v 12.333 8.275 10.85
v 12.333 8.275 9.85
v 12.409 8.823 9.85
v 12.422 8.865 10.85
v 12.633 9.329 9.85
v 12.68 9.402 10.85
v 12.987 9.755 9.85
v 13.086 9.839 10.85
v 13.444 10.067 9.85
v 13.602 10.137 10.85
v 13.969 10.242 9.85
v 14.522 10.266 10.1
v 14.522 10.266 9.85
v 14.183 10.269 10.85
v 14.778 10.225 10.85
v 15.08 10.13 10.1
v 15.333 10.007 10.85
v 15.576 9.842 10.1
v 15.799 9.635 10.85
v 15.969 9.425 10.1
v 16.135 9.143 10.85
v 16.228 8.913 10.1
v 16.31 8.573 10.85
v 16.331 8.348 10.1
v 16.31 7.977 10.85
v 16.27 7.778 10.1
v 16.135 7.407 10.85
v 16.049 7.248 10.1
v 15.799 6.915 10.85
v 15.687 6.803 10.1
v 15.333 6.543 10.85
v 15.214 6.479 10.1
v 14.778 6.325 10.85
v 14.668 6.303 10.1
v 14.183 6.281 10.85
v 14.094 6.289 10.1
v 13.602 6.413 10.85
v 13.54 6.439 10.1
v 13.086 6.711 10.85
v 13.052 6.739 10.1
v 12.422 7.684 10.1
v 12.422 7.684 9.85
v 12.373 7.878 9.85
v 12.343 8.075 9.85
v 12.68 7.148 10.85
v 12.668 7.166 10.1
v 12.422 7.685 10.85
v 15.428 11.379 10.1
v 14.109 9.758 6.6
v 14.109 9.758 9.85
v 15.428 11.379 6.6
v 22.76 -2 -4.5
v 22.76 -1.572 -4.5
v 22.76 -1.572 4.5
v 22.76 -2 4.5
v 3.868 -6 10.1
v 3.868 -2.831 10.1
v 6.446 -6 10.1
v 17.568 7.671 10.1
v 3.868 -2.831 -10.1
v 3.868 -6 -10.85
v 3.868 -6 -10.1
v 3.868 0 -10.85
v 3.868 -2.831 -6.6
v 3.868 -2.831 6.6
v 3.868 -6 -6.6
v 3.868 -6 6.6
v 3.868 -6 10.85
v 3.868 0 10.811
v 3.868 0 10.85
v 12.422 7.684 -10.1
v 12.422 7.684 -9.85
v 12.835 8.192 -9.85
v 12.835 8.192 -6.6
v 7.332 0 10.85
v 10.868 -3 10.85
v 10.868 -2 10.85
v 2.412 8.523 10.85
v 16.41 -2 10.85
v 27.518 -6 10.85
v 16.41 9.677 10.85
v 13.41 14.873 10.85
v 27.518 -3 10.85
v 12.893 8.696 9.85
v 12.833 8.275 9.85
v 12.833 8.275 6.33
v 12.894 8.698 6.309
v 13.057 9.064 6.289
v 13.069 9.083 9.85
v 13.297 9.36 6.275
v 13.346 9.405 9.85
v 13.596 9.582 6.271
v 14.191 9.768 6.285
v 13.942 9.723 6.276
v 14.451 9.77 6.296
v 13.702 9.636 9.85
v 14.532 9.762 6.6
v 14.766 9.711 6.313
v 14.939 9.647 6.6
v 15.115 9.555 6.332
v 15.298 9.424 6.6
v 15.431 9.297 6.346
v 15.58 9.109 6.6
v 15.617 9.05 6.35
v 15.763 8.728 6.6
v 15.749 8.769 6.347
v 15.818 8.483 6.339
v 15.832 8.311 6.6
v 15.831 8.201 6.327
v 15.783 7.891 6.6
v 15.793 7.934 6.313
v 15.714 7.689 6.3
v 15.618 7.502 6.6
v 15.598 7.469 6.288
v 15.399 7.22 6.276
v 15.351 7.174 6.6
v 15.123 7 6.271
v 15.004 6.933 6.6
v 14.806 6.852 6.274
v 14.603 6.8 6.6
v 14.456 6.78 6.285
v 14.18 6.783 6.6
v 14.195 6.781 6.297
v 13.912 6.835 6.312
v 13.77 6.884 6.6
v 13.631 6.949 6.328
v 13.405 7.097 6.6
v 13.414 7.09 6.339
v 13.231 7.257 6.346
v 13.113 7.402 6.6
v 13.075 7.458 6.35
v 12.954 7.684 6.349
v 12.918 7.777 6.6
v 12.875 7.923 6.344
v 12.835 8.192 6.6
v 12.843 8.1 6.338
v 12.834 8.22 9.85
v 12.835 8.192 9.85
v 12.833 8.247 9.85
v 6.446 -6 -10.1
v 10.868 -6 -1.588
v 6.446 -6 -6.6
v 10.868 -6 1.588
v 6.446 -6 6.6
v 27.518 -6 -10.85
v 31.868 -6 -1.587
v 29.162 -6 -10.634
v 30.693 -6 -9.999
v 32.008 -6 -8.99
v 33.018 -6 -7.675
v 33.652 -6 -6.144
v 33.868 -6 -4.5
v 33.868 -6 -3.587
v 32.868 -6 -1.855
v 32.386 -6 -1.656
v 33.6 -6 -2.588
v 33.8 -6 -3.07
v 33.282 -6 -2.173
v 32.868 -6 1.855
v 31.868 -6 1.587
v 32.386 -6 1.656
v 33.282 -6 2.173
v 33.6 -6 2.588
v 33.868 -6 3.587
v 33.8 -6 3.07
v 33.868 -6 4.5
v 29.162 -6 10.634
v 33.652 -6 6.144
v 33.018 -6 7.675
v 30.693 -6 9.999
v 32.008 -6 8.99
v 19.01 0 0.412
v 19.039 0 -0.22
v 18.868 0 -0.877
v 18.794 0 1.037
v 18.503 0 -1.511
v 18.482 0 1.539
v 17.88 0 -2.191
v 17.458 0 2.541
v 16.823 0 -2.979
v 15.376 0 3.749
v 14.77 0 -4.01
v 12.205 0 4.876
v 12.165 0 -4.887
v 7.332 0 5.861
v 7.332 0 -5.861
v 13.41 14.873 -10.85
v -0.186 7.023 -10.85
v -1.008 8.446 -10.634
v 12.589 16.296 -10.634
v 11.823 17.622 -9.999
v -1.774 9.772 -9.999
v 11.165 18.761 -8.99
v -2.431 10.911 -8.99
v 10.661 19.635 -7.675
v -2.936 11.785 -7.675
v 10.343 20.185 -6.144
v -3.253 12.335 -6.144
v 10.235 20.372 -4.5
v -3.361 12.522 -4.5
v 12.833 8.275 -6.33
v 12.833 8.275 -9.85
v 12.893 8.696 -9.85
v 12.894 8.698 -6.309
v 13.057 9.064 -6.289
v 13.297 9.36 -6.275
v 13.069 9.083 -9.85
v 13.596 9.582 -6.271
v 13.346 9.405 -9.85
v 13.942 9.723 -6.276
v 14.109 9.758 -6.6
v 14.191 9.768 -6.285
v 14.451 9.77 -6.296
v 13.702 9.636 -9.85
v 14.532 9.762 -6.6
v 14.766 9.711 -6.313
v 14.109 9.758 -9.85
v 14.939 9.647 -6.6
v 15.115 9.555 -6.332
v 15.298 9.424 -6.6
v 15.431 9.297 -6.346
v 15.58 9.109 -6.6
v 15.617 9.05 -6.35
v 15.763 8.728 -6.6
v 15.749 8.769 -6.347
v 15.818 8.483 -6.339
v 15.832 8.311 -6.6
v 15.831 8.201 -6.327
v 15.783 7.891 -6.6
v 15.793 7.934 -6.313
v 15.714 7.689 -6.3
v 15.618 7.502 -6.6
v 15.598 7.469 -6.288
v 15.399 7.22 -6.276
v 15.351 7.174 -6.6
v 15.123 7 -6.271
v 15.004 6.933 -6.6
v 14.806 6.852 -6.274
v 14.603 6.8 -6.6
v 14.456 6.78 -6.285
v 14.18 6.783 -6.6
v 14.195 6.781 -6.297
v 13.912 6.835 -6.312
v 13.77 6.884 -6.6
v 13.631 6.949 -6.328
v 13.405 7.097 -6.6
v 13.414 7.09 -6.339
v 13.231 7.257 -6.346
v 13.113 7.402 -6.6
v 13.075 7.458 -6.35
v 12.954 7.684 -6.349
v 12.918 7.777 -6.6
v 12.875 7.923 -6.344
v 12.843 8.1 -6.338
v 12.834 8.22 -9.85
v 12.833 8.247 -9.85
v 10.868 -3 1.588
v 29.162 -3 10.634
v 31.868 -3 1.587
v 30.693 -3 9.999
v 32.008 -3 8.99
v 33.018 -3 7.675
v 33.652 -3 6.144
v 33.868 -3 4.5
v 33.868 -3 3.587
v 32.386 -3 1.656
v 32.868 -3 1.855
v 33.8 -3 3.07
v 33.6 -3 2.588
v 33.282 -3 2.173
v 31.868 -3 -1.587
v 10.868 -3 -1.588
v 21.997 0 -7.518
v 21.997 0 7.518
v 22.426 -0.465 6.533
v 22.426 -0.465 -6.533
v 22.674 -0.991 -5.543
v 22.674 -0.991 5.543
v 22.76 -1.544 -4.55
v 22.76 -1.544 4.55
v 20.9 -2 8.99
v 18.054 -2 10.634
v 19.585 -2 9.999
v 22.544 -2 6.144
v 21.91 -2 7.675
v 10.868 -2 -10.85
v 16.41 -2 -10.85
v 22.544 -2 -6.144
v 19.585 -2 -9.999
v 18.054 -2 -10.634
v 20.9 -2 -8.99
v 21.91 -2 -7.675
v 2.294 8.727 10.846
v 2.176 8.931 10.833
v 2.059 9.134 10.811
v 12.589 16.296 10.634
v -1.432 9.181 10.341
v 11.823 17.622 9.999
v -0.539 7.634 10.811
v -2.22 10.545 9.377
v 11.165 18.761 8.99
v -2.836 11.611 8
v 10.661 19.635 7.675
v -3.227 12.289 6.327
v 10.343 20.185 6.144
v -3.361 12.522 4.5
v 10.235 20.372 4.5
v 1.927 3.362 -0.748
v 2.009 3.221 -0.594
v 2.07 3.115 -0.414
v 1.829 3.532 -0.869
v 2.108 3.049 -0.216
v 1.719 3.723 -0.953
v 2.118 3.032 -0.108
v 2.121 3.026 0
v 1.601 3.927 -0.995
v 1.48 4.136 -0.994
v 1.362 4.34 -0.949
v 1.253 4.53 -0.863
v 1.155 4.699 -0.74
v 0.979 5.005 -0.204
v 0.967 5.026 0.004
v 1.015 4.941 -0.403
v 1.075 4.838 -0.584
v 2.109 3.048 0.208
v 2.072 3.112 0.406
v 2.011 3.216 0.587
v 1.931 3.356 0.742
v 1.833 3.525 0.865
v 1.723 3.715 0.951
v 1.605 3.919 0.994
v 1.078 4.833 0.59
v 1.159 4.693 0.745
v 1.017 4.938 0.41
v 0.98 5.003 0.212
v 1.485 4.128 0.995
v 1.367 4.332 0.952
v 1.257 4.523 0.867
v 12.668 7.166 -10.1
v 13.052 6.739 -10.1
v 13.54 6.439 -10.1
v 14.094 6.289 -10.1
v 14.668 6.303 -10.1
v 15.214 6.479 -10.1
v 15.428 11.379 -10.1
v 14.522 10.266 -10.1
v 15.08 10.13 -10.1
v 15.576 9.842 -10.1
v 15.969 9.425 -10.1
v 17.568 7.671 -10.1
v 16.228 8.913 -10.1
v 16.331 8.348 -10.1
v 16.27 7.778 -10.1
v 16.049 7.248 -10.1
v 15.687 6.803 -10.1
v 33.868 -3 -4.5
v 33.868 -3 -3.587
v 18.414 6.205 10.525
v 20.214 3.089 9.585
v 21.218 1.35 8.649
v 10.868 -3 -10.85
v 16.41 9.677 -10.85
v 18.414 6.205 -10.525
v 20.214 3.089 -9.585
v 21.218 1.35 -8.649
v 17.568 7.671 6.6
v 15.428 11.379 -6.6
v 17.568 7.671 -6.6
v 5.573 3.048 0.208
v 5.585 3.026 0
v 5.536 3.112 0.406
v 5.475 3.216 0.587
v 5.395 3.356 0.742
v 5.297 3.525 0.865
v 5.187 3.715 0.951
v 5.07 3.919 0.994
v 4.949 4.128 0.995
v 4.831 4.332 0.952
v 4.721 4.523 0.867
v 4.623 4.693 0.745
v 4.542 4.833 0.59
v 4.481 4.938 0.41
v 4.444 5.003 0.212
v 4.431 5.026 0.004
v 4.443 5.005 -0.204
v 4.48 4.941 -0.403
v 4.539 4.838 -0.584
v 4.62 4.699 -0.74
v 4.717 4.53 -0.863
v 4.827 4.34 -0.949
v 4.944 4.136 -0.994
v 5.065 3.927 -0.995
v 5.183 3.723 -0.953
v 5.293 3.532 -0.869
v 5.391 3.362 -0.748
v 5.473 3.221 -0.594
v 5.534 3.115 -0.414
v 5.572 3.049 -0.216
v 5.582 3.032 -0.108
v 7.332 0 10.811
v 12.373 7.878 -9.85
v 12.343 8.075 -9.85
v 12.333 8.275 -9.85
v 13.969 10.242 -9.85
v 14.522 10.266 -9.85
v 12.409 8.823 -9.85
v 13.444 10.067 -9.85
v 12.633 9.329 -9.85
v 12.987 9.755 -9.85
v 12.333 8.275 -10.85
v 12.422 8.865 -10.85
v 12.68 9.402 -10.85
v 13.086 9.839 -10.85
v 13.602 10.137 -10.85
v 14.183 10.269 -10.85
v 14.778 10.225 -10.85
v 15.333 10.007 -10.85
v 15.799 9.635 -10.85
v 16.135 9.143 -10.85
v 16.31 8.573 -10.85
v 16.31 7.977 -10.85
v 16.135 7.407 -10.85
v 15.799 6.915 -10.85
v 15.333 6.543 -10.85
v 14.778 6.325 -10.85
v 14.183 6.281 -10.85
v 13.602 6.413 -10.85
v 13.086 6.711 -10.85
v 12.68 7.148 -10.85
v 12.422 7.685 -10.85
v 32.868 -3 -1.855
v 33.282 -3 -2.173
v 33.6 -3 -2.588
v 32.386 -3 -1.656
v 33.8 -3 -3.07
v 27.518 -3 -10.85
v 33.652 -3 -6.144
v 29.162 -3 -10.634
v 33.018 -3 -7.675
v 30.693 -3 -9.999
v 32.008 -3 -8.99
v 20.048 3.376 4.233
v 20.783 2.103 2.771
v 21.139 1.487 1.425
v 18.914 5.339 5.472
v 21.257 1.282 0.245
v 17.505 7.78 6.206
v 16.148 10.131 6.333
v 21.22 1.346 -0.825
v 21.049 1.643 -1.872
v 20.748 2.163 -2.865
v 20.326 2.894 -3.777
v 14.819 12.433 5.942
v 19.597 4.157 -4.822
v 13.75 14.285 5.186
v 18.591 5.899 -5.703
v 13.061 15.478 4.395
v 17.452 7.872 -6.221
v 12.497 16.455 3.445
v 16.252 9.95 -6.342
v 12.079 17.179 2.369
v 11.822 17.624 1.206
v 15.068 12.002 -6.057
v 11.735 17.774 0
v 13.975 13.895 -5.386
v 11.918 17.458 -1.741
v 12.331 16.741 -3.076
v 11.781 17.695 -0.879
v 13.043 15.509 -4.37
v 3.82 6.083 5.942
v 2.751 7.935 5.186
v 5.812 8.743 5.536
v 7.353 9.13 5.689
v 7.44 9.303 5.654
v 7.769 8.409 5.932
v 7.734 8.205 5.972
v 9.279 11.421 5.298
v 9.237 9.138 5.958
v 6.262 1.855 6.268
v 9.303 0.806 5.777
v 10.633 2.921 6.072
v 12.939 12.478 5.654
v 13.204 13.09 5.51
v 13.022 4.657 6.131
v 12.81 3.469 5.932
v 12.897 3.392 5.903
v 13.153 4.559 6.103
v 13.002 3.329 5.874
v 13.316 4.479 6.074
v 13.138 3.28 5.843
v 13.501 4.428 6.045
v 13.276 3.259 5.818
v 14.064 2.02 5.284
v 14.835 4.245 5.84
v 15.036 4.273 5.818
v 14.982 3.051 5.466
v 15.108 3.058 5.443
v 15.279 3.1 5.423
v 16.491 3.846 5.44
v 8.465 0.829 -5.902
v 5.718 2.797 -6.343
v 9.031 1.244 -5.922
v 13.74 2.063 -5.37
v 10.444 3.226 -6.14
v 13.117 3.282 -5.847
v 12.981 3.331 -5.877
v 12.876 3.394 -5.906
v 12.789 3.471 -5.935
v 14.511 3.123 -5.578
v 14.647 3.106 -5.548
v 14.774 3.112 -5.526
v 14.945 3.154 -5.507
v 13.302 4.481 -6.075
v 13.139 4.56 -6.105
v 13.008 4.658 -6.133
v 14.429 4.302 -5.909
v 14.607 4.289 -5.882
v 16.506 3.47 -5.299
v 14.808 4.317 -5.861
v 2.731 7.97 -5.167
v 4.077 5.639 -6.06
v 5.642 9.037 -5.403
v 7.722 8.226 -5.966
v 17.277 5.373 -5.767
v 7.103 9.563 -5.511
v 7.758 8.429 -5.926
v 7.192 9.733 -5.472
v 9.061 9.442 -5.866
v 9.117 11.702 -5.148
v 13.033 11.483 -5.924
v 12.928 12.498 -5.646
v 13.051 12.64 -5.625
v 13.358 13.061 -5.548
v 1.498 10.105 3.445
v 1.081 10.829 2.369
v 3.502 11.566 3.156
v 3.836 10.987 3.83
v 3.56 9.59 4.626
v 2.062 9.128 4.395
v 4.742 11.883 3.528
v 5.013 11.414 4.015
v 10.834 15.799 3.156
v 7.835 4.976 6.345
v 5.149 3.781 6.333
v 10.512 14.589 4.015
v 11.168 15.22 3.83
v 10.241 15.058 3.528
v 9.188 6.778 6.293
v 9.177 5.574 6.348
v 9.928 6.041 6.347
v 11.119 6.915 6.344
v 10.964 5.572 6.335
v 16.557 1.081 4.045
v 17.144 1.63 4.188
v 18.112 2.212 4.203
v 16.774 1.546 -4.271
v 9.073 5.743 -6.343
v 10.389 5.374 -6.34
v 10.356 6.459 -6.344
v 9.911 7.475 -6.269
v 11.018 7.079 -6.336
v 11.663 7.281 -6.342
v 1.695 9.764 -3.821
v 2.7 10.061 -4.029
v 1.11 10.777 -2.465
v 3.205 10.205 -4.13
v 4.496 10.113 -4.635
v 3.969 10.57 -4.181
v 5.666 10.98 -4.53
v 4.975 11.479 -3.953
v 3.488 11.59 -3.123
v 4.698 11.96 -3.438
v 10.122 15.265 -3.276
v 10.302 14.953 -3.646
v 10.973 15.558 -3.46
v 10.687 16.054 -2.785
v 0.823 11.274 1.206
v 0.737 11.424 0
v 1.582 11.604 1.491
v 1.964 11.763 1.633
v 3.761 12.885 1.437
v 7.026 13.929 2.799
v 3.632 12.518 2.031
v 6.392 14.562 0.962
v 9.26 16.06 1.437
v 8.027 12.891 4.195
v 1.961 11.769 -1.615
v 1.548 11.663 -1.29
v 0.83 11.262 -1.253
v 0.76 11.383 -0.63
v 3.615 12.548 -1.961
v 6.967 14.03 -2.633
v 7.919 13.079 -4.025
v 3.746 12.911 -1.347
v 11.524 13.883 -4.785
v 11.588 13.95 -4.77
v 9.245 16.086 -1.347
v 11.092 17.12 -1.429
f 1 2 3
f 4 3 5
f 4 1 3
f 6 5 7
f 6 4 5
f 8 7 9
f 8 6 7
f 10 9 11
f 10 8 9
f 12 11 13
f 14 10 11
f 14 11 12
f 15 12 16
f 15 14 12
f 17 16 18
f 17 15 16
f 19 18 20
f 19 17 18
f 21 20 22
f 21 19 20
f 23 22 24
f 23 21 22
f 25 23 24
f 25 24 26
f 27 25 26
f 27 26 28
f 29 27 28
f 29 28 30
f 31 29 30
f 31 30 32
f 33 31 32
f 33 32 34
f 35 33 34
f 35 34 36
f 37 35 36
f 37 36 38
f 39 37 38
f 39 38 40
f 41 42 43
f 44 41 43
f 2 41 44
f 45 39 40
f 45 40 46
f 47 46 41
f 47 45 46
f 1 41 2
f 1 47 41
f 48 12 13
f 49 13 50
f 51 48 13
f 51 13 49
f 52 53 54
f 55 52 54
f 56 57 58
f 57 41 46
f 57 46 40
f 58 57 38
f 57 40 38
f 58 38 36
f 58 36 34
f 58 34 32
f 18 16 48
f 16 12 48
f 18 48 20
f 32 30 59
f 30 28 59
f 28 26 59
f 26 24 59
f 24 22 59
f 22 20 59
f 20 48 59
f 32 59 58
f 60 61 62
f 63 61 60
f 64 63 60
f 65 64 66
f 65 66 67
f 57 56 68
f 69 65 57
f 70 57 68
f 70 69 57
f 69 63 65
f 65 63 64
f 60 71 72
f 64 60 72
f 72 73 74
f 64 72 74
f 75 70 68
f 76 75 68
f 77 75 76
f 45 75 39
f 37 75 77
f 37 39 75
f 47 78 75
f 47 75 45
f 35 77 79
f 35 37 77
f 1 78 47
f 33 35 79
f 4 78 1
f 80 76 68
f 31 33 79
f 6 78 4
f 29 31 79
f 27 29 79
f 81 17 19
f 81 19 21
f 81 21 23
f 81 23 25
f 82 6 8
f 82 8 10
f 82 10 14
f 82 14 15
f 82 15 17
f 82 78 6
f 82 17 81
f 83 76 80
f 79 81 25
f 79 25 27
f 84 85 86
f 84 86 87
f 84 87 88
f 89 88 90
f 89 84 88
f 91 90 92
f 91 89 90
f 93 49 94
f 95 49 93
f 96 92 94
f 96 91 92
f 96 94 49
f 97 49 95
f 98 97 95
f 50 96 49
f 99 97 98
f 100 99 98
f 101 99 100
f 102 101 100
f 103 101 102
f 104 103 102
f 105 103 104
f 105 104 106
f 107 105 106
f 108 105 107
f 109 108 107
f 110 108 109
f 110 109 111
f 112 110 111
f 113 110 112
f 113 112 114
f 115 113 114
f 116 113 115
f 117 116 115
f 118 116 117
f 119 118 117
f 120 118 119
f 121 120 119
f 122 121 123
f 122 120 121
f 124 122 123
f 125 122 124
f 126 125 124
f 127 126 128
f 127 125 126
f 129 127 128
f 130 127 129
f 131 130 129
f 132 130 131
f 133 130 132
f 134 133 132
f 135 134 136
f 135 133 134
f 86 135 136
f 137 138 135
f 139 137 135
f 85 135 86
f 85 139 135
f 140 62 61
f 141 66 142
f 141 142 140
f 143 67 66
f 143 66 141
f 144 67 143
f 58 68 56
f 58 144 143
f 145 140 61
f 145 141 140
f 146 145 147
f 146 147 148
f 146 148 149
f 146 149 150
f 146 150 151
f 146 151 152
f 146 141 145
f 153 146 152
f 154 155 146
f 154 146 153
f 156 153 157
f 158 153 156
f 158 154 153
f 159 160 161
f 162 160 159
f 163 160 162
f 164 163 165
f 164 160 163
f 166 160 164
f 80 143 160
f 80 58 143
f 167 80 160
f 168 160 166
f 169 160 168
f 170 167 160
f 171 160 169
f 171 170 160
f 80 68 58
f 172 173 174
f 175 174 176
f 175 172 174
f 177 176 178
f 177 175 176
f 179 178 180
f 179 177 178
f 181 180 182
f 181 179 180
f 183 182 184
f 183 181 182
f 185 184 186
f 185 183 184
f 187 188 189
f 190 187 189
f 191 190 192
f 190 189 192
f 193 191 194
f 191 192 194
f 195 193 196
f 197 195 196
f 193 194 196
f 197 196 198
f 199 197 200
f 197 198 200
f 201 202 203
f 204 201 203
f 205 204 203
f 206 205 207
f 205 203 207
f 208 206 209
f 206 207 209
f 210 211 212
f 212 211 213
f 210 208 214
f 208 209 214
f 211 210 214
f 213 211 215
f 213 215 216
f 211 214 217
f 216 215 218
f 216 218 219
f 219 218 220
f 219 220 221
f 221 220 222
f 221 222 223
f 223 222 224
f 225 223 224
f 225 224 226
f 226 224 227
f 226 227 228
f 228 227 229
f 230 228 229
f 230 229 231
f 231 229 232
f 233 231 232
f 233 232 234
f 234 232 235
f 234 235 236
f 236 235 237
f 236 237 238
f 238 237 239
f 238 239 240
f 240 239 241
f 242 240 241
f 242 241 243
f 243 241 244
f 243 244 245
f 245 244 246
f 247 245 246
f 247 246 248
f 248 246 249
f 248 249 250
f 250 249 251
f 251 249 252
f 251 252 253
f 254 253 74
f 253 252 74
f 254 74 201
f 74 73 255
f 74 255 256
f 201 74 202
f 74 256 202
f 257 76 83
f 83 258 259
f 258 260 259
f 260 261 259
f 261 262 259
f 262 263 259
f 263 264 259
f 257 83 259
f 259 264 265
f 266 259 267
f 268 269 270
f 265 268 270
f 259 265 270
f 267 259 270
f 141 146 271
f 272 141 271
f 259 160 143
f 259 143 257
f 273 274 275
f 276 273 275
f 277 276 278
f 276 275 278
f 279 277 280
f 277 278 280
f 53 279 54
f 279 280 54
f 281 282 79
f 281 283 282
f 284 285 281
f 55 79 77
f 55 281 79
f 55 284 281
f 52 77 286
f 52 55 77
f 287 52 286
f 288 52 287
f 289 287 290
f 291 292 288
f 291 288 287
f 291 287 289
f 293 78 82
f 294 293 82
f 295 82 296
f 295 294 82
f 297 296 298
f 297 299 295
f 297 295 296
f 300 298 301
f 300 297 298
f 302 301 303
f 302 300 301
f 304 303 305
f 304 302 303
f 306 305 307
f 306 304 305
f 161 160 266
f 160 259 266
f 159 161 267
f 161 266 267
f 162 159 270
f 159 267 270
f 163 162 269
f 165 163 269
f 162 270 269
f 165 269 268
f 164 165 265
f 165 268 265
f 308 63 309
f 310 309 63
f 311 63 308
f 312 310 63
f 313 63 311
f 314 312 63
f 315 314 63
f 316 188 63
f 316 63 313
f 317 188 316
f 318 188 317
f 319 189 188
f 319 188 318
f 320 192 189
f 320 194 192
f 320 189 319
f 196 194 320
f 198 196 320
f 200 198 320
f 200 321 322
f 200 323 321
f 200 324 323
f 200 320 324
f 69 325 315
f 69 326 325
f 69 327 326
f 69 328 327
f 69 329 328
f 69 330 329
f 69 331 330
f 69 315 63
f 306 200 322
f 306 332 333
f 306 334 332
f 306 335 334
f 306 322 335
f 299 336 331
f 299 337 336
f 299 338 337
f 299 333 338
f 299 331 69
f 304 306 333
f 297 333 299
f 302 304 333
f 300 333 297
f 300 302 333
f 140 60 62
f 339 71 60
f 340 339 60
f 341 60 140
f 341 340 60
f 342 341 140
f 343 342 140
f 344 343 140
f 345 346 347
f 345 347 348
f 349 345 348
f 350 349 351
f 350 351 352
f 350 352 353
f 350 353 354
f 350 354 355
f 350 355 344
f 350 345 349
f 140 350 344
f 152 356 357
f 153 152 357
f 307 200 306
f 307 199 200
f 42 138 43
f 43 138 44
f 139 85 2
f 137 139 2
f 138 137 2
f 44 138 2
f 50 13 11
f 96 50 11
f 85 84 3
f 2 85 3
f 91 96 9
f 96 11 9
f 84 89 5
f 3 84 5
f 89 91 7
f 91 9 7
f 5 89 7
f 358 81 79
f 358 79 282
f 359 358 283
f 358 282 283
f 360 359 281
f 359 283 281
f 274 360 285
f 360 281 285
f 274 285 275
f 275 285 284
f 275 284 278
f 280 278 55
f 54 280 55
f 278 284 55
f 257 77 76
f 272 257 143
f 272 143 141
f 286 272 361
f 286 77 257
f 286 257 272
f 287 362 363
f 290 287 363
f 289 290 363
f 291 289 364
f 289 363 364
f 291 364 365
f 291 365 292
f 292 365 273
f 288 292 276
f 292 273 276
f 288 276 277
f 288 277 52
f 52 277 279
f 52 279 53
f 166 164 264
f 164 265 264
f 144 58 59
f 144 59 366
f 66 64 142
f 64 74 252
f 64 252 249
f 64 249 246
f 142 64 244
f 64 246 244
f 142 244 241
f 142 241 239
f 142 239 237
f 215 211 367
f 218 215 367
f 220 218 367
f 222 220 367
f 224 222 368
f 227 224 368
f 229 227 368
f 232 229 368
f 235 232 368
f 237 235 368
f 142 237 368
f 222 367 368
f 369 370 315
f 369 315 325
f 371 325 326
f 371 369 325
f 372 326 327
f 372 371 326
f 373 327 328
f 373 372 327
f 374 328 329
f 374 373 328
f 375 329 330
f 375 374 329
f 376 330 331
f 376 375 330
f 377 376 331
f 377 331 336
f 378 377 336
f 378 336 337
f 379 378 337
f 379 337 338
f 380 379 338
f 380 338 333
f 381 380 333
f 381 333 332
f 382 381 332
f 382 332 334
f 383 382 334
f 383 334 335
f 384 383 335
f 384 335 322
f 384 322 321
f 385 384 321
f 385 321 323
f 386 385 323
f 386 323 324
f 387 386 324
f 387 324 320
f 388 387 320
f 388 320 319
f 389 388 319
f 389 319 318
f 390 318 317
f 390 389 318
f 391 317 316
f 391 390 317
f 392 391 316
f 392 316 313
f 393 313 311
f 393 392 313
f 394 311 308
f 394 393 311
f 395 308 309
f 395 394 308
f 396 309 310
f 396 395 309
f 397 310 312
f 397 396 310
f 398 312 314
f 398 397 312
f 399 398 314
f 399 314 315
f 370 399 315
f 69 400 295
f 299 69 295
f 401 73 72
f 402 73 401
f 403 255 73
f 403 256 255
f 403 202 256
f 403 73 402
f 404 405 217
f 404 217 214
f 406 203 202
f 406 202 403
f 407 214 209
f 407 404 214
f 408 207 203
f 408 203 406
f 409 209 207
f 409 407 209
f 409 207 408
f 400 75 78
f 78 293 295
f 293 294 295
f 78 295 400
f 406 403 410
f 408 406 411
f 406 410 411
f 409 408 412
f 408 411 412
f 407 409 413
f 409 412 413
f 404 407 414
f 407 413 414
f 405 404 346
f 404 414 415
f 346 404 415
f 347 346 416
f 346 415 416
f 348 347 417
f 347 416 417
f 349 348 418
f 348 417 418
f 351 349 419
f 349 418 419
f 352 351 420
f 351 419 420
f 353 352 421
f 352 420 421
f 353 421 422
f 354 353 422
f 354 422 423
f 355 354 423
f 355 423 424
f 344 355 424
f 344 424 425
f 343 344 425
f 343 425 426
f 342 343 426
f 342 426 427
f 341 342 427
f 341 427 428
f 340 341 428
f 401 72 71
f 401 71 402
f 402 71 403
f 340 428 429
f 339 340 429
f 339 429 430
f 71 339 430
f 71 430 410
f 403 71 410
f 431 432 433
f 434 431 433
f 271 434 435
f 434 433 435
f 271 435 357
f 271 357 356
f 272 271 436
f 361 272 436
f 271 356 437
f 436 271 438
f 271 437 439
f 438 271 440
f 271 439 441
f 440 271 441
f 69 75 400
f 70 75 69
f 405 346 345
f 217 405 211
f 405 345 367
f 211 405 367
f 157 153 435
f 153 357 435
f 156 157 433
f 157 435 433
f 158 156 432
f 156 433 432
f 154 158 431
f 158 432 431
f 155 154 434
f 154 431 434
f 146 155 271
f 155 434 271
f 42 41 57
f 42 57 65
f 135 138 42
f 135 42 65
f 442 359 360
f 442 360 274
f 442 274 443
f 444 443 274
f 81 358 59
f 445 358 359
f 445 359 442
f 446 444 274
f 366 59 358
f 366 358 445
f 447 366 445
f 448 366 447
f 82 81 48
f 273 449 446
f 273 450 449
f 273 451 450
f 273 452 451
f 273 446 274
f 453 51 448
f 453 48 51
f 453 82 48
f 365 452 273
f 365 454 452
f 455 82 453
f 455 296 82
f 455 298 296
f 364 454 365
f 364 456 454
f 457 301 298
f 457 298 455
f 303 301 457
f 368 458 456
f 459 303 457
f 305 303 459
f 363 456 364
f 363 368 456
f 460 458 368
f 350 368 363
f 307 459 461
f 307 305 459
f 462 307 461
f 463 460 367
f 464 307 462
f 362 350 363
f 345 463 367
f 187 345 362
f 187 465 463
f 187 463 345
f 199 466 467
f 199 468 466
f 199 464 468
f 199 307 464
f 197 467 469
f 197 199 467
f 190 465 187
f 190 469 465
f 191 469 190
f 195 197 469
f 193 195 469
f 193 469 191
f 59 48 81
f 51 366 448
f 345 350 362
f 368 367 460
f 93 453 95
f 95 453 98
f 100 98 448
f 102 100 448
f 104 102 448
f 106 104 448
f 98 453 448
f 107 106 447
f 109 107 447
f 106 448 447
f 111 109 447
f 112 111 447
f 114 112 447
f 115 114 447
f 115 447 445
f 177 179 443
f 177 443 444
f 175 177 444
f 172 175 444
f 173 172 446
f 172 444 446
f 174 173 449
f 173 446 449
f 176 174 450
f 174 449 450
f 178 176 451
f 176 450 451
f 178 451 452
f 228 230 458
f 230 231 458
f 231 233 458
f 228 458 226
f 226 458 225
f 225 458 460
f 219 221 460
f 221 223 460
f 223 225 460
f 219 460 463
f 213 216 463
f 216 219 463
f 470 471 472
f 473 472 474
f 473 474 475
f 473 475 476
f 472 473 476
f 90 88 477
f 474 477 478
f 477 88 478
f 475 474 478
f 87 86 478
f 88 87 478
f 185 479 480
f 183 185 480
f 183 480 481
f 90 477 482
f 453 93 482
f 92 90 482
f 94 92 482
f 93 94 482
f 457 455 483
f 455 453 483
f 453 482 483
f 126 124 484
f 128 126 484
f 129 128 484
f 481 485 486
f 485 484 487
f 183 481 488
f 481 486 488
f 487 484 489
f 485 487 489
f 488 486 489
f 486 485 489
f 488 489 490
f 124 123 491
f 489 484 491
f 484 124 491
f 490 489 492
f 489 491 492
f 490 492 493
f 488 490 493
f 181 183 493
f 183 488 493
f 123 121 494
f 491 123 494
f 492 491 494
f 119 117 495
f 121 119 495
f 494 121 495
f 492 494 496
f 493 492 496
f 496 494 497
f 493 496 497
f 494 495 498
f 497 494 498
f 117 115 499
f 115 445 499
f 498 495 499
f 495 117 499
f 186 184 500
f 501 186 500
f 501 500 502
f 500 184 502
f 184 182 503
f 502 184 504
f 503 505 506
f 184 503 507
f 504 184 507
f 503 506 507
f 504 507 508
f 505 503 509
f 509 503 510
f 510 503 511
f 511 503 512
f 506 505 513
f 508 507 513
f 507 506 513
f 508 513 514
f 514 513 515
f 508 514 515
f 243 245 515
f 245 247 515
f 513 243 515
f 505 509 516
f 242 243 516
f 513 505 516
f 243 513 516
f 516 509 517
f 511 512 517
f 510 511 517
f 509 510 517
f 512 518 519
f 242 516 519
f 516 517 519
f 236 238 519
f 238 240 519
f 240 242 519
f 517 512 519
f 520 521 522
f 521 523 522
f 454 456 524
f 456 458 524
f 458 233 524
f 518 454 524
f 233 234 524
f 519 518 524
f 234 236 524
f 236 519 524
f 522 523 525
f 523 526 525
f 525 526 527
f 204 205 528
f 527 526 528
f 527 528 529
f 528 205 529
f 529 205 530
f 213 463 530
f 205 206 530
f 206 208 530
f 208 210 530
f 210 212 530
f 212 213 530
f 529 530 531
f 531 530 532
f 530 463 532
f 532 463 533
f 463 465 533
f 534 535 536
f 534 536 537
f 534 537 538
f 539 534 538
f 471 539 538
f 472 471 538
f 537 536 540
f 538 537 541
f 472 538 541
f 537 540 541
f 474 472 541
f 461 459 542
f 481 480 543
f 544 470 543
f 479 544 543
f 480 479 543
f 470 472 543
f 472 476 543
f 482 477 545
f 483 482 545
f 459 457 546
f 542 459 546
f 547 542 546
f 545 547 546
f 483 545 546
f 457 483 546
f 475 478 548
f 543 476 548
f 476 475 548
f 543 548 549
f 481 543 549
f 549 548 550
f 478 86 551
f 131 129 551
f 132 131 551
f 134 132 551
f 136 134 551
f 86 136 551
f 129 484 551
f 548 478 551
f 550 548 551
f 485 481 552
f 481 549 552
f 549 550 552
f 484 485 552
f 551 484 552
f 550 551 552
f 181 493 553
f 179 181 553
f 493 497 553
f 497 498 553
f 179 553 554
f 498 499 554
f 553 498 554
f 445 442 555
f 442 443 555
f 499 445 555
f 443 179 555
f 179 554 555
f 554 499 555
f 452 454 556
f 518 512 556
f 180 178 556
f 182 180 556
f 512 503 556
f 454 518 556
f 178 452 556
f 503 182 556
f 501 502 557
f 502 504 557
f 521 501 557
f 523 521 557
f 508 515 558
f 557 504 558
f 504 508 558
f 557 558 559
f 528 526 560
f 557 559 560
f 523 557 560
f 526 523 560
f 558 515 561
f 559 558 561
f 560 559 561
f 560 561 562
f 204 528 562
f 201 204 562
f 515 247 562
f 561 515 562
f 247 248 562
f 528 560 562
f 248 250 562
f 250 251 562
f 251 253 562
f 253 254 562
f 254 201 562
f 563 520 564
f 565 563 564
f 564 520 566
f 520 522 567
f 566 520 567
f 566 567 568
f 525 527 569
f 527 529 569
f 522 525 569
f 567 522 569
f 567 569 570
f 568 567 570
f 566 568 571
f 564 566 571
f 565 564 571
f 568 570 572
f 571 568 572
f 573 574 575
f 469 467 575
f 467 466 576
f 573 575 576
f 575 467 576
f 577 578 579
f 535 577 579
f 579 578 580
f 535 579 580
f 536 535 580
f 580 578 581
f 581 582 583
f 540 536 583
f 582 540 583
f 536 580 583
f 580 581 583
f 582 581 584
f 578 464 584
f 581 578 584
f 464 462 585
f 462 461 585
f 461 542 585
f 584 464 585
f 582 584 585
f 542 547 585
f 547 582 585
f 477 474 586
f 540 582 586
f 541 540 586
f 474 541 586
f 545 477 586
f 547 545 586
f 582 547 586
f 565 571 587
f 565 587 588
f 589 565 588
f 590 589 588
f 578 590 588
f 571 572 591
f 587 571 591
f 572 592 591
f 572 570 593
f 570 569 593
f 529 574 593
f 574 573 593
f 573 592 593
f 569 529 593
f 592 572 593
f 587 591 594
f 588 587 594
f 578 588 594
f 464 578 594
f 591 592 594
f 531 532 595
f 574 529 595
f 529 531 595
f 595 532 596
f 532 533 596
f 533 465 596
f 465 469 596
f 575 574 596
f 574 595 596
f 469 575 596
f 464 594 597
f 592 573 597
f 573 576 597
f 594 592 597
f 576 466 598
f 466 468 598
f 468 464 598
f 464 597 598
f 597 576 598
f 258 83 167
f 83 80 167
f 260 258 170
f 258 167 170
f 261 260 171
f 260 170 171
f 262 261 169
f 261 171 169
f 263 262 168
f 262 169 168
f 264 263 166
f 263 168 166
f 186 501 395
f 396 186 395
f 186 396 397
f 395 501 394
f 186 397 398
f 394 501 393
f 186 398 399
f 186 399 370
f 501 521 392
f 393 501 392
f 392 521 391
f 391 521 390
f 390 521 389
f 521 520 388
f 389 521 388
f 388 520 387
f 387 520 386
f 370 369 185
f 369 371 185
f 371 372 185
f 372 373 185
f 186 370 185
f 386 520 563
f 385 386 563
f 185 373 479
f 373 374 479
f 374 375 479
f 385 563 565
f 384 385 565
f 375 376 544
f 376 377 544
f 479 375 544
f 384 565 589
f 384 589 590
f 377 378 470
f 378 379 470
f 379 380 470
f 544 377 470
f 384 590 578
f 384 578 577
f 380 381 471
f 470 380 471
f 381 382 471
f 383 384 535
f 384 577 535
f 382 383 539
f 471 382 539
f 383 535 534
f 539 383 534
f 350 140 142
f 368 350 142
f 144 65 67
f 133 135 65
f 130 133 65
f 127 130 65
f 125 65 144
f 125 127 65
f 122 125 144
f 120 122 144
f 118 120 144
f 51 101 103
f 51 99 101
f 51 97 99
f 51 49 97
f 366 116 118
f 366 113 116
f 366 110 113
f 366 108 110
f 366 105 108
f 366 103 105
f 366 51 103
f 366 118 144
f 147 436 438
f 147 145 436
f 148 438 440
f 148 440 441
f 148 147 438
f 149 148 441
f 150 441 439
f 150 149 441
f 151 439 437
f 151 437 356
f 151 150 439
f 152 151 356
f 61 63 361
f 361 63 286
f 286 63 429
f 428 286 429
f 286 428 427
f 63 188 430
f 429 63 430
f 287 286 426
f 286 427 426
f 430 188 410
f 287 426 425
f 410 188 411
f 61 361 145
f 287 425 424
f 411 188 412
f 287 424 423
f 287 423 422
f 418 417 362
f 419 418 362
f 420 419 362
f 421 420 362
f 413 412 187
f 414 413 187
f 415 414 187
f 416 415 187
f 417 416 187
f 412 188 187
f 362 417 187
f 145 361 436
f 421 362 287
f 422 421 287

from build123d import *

# Parameters (mm, degrees)
SKETCH2_W           = 21.7
SKETCH2_H           = 25.05
SKETCH2_RX          = 9.525
SKETCH2_RY          = 6.35
BOSS_EXTRUDE1_DEPTH = 12.7
SKETCH3_W           = 21.660653916
SKETCH3_H           = 25.05
BOSS_EXTRUDE2_DEPTH = 3
SKETCH5_W           = 18.892037138
SKETCH5_H           = 21.7
BOSS_EXTRUDE3_DEPTH = 2
SKETCH6_W           = 30
SKETCH6_H           = 21.7
BOSS_EXTRUDE4_DEPTH = 4
SKETCH7_W           = 21.7
SKETCH7_H           = 1
SKETCH7_W_2         = 3.175
SKETCH7_H_2         = 3
CUT_EXTRUDE2_DEPTH  = 23
SKETCH7_3_W         = 21.7
SKETCH7_3_H         = 7.272473706
CUT_EXTRUDE3_DEPTH  = 44.803879418
SKETCH11_R          = 1
CUT_EXTRUDE8_DEPTH  = 33.487034031
SKETCH15_W          = 4
SKETCH15_H          = 3.5
CUT_EXTRUDE9_DEPTH  = 28.443249292
CUT_EXTRUDE4_REACH  = 47.088
SKETCH9_R           = 1.5
SKETCH10_R          = 2
CUT_EXTRUDE7_DEPTH  = 1
FILLET5_R           = 6.35
FILLET6_R           = 2
FILLET7_R           = 2


with BuildPart() as part:
    # Sketch2 → Boss-Extrude1 (new body)
    with BuildSketch(Plane(origin=(16.497783942, 9.525, 0), x_dir=(0, 0, -1), z_dir=(0.8660254037844379, 0.5000000000000013, 0))):
        Rectangle(SKETCH2_W, SKETCH2_H)
        with Locations(Location((0, 0), (0, 0, 90))):
            Ellipse(SKETCH2_RX, SKETCH2_RY, mode=Mode.SUBTRACT)
    extrude(amount=-BOSS_EXTRUDE1_DEPTH)

    # Sketch3 → Boss-Extrude2 (add)
    with BuildSketch(Plane(origin=(5.499261314, 3.175, 0), x_dir=(0, 0, 1), z_dir=(-0.8660254037844379, -0.5000000000000014, 0))):
        with Locations((-0.019673042, 0)):
            Rectangle(SKETCH3_W, SKETCH3_H)
    extrude(amount=BOSS_EXTRUDE2_DEPTH)

    # Sketch5 → Boss-Extrude3 (add)
    with BuildSketch(Plane(origin=(0, 0, 0), x_dir=(-1, 0, 0), z_dir=(0, 1, 0))):
        with Locations((-13.314265373, 0)):
            Rectangle(SKETCH5_W, SKETCH5_H)
    extrude(amount=-BOSS_EXTRUDE3_DEPTH)

    # Sketch6 → Boss-Extrude4 (add)
    with BuildSketch(Plane.XZ.offset(2)):
        with Locations((18.868246804, 0)):
            Rectangle(SKETCH6_W, SKETCH6_H)
    extrude(amount=BOSS_EXTRUDE4_DEPTH)

    # Sketch7 → Cut-Extrude2 (cut)
    with BuildSketch(Plane(origin=(33.868246804, 0, 0), x_dir=(0, 0, -1), z_dir=(1, 0, 0))):
        with Locations((0, -2.5)):
            Rectangle(SKETCH7_W, SKETCH7_H)
        with Locations((0, -4.5)):
            Rectangle(SKETCH7_W_2, SKETCH7_H_2)
    extrude(amount=-CUT_EXTRUDE2_DEPTH, mode=Mode.SUBTRACT)

    # Sketch7<3> → Cut-Extrude3 (cut, through all)
    with BuildSketch(Plane(origin=(33.868246804, 0, 0), x_dir=(0, 0, -1), z_dir=(1, 0, 0))):
        with Locations((0, -9.636236853)):
            Rectangle(SKETCH7_3_W, SKETCH7_3_H)
    extrude(amount=-CUT_EXTRUDE3_DEPTH, mode=Mode.SUBTRACT)

    # Sketch11 → Cut-Extrude8 (cut, through all)
    with BuildSketch(Plane(origin=(19.672783942, 0.194872981, 0), x_dir=(0, 0, -1), z_dir=(-1, 0, 0))):
        with Locations(Location((0, -3.830865705, 0), (0, 0, 90))):
            Circle(SKETCH11_R)
    extrude(amount=CUT_EXTRUDE8_DEPTH, mode=Mode.SUBTRACT)

    # Sketch15 → Cut-Extrude9 (cut, symmetric)
    with BuildSketch(Plane(origin=(16.497783942, 9.525, 0), x_dir=(0.7757354378747654, -0.6310582623064579, 0), z_dir=(0.6310582623064579, 0.7757354378747654, 0))):
        with Locations((0, -8.35)):
            Rectangle(SKETCH15_W, SKETCH15_H)
    cut_extrude9 = extrude(amount=CUT_EXTRUDE9_DEPTH, both=True, mode=Mode.SUBTRACT)

    # Sketch9 → Cut-Extrude4 (cut, up to next)
    with BuildSketch(Plane(origin=(0, 0, -10.85), x_dir=(-1, 0, 0), z_dir=(0, 0, -1)), mode=Mode.PRIVATE) as cut_extrude4_sk1:
        with Locations((-14.332720433, 8.275)):
            Circle(SKETCH9_R)
    cut_extrude4_tool1 = extrude(cut_extrude4_sk1.sketch, amount=-CUT_EXTRUDE4_REACH, mode=Mode.PRIVATE) & part.part
    cut_extrude4 = cut_extrude4_tool1.solids().sort_by_distance((14.33272, 8.275, -10.85))[0]
    add(cut_extrude4, mode=Mode.SUBTRACT)

    # Sketch10 → Cut-Extrude7 (cut)
    with BuildSketch(Plane(origin=(0, 0, -10.85), x_dir=(-1, 0, 0), z_dir=(0, 0, -1))):
        with Locations((-14.332720433, 8.275)):
            Circle(SKETCH10_R)
    cut_extrude7 = extrude(amount=-CUT_EXTRUDE7_DEPTH, mode=Mode.SUBTRACT)

    # Mirror1: Cut-Extrude9, Cut-Extrude4, Cut-Extrude7 across plane
    add(cut_extrude9.mirror(Plane.XY), mode=Mode.SUBTRACT)
    add(cut_extrude4.mirror(Plane.XY), mode=Mode.SUBTRACT)
    add(cut_extrude7.mirror(Plane.XY), mode=Mode.SUBTRACT)

    # Fillet5
    fillet5_edges = [part.edges().sort_by_distance(p)[0] for p in [
        (33.868246804, -4.5, 10.85),
        (33.868246804, -4.5, -10.85),
        (22.760283942, -1, -10.85),
        (22.760283942, -1, 10.85),
        (4.736022628, 17.196968182, 10.85),
        (3.436984522, 16.446968182, -10.85),
    ]]
    fillet(fillet5_edges, radius=FILLET5_R)

    # Fillet6
    fillet6_edges = [part.edges().sort_by_distance(p)[0] for p in [
        (33.868246804, -4.5, 1.5875),
        (33.868246804, -4.5, -1.5875),
    ]]
    fillet(fillet6_edges, radius=FILLET6_R)

    # Fillet7
    # the kernel refuses this fillet: 2 mm, written as the material it takes off along each edge
    with BuildSketch(Plane(origin=(22.760283942, 0, 8.429393602), x_dir=(-1, 0, 0), z_dir=(0, 0, -1))) as fillet7_piece_1:
        with BuildLine():
            CenterArc((2, -1.571757441), FILLET7_R, 128.197977663, 51.802022337)
            Line((0, -1.571757441), (-0.04, -1.571757441))
            Line((-0.04, -1.571757441), (-0.04, 0))
            Line((-0.04, 0), (0, 0.04))
            ThreePointArc((0, 0.04), (0.381619343, 0.04), (0.73850346, 0.031435149))
            Line((0.73850346, 0.031435149), (0.763238686, 0))
        make_face()
    extrude(amount=16.858787203, mode=Mode.SUBTRACT)


solid = part.part
